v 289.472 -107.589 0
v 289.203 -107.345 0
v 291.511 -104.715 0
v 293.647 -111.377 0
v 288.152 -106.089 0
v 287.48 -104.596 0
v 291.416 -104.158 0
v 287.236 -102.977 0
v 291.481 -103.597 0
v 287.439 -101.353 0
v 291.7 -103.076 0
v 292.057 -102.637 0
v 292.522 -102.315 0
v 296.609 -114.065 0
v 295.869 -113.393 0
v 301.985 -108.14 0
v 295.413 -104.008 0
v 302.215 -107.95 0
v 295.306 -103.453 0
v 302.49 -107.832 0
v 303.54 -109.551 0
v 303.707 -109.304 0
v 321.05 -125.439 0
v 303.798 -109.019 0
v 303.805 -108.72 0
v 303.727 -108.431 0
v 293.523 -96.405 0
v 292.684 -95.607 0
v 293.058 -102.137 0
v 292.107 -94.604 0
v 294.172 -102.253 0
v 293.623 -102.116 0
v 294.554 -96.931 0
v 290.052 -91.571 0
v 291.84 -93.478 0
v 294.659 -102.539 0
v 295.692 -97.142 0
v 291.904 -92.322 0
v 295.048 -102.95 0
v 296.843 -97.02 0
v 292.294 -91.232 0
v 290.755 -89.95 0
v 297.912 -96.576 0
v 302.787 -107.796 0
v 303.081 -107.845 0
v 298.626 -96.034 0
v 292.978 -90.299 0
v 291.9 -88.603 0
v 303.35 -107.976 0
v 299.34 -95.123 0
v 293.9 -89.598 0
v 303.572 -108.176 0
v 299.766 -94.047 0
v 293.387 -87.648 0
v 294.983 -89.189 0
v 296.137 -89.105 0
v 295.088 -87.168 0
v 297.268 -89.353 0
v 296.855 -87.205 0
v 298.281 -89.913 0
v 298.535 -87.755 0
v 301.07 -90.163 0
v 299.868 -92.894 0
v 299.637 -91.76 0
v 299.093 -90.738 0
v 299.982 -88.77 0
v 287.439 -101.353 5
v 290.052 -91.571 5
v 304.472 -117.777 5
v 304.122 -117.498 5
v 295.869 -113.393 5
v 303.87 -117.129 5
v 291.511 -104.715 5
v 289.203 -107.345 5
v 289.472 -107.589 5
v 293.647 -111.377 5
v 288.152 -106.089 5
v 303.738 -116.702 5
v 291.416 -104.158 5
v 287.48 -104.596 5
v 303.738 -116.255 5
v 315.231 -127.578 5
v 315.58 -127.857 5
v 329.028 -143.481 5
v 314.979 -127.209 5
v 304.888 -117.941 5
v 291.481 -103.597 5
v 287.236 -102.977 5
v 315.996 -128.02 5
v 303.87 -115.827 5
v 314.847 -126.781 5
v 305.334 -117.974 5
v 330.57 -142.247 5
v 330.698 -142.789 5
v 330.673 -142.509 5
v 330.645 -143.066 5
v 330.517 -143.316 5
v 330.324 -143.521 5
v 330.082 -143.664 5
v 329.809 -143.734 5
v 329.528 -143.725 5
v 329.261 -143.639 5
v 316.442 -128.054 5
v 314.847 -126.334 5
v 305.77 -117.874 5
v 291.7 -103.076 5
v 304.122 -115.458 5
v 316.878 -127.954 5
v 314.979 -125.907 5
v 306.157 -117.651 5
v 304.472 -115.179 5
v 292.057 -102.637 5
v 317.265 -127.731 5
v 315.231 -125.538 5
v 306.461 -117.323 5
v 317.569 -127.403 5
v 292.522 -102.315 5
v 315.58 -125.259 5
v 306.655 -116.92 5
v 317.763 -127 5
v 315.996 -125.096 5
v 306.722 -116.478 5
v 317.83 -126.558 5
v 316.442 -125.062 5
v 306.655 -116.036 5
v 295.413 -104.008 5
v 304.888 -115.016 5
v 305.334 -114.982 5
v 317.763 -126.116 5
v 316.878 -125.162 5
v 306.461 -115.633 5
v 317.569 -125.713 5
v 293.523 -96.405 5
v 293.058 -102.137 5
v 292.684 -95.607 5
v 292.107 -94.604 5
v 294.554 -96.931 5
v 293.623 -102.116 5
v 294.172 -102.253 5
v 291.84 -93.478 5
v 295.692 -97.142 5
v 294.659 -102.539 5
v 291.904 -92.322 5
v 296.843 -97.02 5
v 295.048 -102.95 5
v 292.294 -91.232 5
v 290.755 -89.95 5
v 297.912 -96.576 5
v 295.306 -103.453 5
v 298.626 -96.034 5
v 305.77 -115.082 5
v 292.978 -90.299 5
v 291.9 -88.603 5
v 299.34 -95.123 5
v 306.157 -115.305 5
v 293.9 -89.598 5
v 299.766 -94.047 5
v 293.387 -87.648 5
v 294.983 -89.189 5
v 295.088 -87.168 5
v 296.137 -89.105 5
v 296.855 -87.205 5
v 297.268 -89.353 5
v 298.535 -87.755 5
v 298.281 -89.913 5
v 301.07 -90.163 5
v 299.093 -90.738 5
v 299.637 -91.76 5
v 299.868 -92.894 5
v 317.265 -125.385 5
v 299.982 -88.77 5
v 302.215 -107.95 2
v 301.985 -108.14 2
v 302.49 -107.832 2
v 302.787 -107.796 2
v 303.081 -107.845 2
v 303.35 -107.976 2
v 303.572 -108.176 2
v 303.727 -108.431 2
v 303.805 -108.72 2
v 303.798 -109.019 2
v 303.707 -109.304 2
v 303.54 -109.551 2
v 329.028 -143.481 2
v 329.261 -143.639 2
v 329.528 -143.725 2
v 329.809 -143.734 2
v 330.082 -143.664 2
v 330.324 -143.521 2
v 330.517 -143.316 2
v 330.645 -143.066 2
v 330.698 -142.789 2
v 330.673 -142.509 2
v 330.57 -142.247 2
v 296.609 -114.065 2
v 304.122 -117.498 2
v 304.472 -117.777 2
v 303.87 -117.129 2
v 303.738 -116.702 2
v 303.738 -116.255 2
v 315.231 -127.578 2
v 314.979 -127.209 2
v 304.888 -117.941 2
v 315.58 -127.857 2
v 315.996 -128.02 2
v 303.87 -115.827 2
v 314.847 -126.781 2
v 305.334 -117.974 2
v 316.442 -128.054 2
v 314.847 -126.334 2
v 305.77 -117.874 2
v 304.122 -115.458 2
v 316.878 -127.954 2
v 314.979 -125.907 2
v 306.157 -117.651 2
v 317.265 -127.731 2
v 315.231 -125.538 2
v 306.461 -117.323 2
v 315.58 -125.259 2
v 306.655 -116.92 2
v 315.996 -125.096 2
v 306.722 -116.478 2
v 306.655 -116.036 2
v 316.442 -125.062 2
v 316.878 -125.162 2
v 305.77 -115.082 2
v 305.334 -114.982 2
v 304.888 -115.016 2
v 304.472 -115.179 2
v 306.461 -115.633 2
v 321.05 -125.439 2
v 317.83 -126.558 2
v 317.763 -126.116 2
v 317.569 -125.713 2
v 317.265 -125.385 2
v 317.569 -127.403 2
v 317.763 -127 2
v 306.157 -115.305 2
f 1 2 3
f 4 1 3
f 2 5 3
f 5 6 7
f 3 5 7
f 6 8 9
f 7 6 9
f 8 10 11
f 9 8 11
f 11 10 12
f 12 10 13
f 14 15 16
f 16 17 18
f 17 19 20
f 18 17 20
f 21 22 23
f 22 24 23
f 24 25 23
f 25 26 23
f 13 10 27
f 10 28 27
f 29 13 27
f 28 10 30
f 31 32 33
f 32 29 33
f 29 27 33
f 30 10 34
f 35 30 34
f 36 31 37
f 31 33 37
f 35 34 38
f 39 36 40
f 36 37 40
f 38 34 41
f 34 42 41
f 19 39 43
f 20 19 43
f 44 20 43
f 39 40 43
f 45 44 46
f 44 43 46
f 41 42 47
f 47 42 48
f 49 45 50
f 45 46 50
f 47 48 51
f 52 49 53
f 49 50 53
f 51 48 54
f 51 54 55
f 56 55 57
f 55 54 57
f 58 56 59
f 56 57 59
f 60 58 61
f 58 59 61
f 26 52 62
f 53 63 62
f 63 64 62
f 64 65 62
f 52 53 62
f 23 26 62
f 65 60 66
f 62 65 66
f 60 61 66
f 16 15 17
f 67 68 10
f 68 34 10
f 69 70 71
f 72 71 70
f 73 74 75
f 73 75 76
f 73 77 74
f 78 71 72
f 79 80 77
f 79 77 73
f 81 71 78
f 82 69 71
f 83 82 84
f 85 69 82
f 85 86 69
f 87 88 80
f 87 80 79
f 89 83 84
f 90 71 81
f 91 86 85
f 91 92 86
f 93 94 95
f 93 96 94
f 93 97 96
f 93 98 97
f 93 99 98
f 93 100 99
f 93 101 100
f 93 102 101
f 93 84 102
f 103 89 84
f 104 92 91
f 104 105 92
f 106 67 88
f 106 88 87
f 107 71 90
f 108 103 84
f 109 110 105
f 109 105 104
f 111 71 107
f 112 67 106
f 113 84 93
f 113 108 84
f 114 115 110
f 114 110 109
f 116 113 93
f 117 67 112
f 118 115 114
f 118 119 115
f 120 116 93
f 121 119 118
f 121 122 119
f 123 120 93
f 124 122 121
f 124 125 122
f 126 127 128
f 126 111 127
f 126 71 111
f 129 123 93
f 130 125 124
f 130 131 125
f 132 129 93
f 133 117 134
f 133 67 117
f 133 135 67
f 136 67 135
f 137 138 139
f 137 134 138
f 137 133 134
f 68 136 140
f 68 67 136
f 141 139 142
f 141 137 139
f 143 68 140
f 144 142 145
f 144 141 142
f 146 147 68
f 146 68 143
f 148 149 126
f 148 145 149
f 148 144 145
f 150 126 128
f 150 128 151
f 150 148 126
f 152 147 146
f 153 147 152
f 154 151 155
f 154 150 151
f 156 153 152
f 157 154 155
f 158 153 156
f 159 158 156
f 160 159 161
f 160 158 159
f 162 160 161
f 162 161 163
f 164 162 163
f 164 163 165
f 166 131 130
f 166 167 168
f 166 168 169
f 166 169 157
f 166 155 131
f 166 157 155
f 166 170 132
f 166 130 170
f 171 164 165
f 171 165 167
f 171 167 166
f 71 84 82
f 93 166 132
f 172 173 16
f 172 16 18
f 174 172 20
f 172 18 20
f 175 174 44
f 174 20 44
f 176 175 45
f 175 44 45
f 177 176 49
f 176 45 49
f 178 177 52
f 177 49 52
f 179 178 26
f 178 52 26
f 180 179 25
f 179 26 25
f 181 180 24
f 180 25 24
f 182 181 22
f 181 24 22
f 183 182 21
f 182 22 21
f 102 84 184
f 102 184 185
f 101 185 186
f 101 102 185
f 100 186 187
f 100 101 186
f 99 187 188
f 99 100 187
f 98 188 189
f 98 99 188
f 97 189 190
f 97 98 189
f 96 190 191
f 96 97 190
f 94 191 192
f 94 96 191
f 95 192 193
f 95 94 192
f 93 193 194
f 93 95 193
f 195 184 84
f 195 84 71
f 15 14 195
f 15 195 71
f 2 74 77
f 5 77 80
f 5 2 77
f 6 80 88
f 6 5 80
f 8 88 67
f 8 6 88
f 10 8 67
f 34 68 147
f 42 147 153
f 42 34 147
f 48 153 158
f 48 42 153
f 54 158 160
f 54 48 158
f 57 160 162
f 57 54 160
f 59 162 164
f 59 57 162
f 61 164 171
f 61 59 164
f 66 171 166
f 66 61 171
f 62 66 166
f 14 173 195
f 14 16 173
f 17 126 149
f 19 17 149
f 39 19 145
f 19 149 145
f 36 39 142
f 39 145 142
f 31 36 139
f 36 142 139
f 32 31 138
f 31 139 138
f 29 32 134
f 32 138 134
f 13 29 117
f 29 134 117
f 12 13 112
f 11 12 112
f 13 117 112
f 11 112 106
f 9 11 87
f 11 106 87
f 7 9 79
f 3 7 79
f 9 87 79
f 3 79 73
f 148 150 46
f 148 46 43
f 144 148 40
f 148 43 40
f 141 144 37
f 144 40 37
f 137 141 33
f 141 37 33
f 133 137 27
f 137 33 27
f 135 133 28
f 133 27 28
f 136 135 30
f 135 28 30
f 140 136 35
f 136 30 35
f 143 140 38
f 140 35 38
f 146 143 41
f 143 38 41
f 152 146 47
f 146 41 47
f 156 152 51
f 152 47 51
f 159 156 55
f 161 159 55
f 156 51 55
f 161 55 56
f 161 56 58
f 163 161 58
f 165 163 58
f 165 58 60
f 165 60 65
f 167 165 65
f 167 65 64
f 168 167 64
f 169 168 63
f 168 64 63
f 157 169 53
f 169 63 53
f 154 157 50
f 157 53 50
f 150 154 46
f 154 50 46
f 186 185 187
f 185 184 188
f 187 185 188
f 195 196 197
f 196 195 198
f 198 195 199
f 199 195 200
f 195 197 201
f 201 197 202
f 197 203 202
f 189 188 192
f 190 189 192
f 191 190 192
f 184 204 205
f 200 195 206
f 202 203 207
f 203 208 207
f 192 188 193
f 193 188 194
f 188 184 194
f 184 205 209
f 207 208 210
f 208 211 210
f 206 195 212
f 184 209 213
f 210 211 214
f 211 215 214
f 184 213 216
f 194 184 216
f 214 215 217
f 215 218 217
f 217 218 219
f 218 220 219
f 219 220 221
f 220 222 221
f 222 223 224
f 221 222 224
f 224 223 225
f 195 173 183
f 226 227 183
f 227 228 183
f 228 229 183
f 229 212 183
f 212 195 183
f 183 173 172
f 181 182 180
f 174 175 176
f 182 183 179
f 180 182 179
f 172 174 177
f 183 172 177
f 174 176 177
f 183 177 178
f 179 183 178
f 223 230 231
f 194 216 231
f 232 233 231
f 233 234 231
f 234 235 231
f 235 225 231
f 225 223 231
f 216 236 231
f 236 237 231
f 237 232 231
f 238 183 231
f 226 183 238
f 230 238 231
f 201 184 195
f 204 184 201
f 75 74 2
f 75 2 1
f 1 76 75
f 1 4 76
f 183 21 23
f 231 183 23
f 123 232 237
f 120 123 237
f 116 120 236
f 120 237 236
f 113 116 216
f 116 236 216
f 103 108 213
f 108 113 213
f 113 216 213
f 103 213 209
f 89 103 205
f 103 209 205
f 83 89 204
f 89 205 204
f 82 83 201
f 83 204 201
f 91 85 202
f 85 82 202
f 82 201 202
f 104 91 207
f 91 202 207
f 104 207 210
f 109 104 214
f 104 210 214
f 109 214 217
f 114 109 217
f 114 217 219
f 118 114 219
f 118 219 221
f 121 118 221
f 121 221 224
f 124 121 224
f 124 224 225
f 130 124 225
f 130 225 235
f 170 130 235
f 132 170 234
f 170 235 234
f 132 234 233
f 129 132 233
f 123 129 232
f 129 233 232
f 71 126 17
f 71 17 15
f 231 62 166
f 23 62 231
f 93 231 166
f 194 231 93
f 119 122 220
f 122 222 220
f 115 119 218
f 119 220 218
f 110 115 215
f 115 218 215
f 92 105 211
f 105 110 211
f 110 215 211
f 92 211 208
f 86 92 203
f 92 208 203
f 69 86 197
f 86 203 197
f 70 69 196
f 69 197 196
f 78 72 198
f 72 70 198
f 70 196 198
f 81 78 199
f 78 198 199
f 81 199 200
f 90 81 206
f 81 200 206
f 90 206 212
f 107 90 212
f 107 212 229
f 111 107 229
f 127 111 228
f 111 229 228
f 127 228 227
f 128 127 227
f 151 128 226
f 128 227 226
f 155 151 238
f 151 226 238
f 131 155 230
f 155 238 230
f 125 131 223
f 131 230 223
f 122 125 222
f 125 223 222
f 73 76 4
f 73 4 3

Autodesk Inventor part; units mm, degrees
ref_plane "YZ Plane" through (0, 0, 0) normal (1, 0, 0) x (0, 1, 0)
ref_plane "XZ Plane" through (0, 0, 0) normal (0, 1, 0) x (-1, 0, 0)
ref_plane "XY Plane" through (0, 0, 0) normal (0, 0, 1) x (1, 0, 0)
sketch "スケッチ1" plane through (0, 0, 0) normal (0, 0, 1) x (1, 0, 0)
  circle A0 centre (295.848871, -93.120076) radius 1.5
  circle A1 centre (295.848871, -93.120076) radius 3.025
  line L0 (302.911618, -92.777137) -> (291.344796, -101.566309)
  arc A2 (282.40584, -101.176779) -> (291.344796, -101.566309) centre (287.109706, -95.992799) ccw
  arc A3 (299.078829, -95.689522) -> (299.346701, -89.542385) centre (296.658778, -92.504659) ccw
  line L1 (214.413679, -12.475426) -> (302.911618, -92.777137)
  line L2 (186.870748, -14.489658) -> (289.472001, -107.588508)
  line L3 (89.513673, -53) -> (377.048162, -53)
  circle A4 centre (295.848871, -93.120076) radius 4.025
  circle A5 centre (295.848871, -93.120076) radius 6
  line L4 (290.052231, -91.571215) -> (285.593636, -108.257588)
  circle A6 centre (285.42622, -97.165857) radius 3.025
  arc A7 (287.438666, -101.35253) -> (289.20342, -107.344802) centre (293.235305, -102.901391) ccw
  circle A8 centre (298.015884, -108.589531) radius 3
  circle A9 centre (298.015884, -108.589531) radius 1.5
  line L5 (185.106531, 0.614305) -> (481.333939, -268.178035)
  line L6 (295.848871, -93.120076) -> (289.20342, -100.443813) construction
  line L7 (301.069617, -90.163082) -> (333.637532, -147.663653)
  line L8 (333.637532, -147.663653) -> (289.20342, -107.344802)
  circle A10 centre (295.848871, -93.120076) radius 1.5
  circle A11 centre (295.848871, -93.120076) radius 3.025
  line L9 (302.911618, -92.777137) -> (291.344796, -101.566309)
  arc A12 (282.40584, -101.176779) -> (291.344796, -101.566309) centre (287.109706, -95.992799) ccw
  arc A13 (299.078829, -95.689522) -> (299.346701, -89.542385) centre (296.658778, -92.504659) ccw
  line L10 (214.413679, -12.475426) -> (302.911618, -92.777137)
  line L11 (186.870748, -14.489658) -> (289.472001, -107.588508)
  line L12 (89.513673, -53) -> (377.048162, -53)
  circle A14 centre (295.848871, -93.120076) radius 4.025
  circle A15 centre (295.848871, -93.120076) radius 6
  line L13 (290.052231, -91.571215) -> (285.593636, -108.257588)
  circle A16 centre (285.42622, -97.165857) radius 3.025
  arc A17 (287.438666, -101.35253) -> (289.20342, -107.344802) centre (293.235305, -102.901391) ccw
  circle A18 centre (298.015884, -108.589531) radius 3 construction
  circle A19 centre (298.015884, -108.589531) radius 1.5
  line L14 (185.106531, 0.614305) -> (481.333939, -268.178035)
  line L15 (295.848871, -93.120076) -> (289.20342, -100.443813) construction
  line L16 (301.069617, -90.163082) -> (333.637532, -147.663653)
  line L17 (333.637532, -147.663653) -> (289.20342, -107.344802)
  line L18 (301.984952, -108.140062) -> (343.184474, -145.523895)
  circle A20 centre (305.221577, -116.478183) radius 1.5
  circle A21 centre (316.330105, -126.557896) radius 1.5
  line L19 (301.984952, -108.140062) -> (293.498432, -117.492783)
  arc A22 (303.540146, -109.551222) -> (301.984952, -108.140062) centre (302.762549, -108.845642) ccw
  line L20 (301.984952, -108.140062) -> (302.762549, -108.845642) construction
  line L21 (303.540146, -109.551222) -> (302.762549, -108.845642) construction
  point P0 (0, 0)
  point P1 (0, 0)
  point P2 (297.912288, -96.575931)
  point P3 (298.625557, -96.033946)
  point P4 (0, 0)
  point P5 (296.609105, -114.064611)
  point P6 (321.049741, -125.439168)
  dimension "d0" = 8.05
  dimension "d1" = 12
  dimension "d2" = 6
  dimension "d3" = 6
  dimension "d4" = 3
  dimension "d5" = 5
  dimension "d6" = 12
  dimension "d7" = 60
  dimension "d11" = 8.05
  dimension "d12" = 12
  dimension "d13" = 6
  dimension "d14" = 6
  dimension "d15" = 3
  dimension "d16" = 5
  dimension "d17" = 12
  dimension "d18" = 60
  dimension "d19" = 8
  dimension "d20" = 4
  dimension "d21" = 4
  dimension "d22" = 3
  dimension "d23" = 50
  dimension "d24" = 8
  dimension "d25" = 15
  dimension "d28" = 1.05
  dimension "d29" = 180
extrude "押し出し1" add sketch "スケッチ1" along normal blind 5 contours L7 L5 A5 L0 | L0 A5 L1 L7 | L1 A5 L7 | A5 L5 L0 A4 | L0 A3 L1 A5 | L7 L18 A22 L19 A8 L8 L2 A7 A2 L0 A5 L5 | L1 A5 | L0 A4 L5 A5 L1 A3 | A5 L0 L5 | L7 L8 L19 A8 L18 | A4 L0 | A5 L5 L0 | L0 A2 A7 L4 L5 A5 | L18 A22 | A5 L5 L4 | L19 A8 | A8 L19 | A9 picked at (298.233704, -96.341002)
fillet "フィレット1" radius 1 1 edges at (333.6375, -147.6637, 2.5)
extrude "押し出し2" cut sketch "スケッチ1" along normal blind 2 contours L7 L8 L19 A8 L18 | L18 A22 | L19 A8 picked at (299.870596, -110.60445)
sketch "スケッチ2" plane through (0, 0, 5) normal (0, 0, 1) x (1, 0, 0)
  arc A0 (329.027651, -143.480716) -> (330.569756, -142.247316) centre (329.699632, -142.740148) ccw
  line L0 (330.569756, -142.247316) -> (301.069617, -90.163082)
  arc A1 (301.069617, -90.163082) -> (290.052231, -91.571215) centre (295.848871, -93.120076) ccw
  line L1 (290.052231, -91.571215) -> (287.438666, -101.35253)
  arc A2 (287.438666, -101.35253) -> (289.20342, -107.344802) centre (293.235305, -102.901391) ccw
  line L2 (289.20342, -107.344802) -> (329.027651, -143.480716)
  arc A3 (298.625557, -96.033946) -> (297.912288, -96.575931) centre (295.848871, -93.120076) ccw
  line L3 (298.625557, -96.033946) -> (297.912288, -96.575931)
  circle A4 centre (316.330105, -126.557896) radius 1.5
  circle A5 centre (305.221577, -116.478183) radius 1.5
  line L4 (301.984952, -108.140062) -> (296.609105, -114.064611)
  line L5 (289.20342, -107.344802) -> (296.609105, -114.064611)
  line L6 (293.646831, -111.376687) -> (291.510724, -104.715452)
  line L7 (295.412844, -104.007733) -> (295.868537, -113.39263)
  arc A6 (295.412844, -104.007733) -> (291.510724, -104.715452) centre (293.415198, -104.104731) ccw
  point P0 (0, 0)
  point P1 (293.646831, -111.376687)
  dimension "d31" = 30
  dimension "d32" = 45
  dimension "d33" = 3
  dimension "d34" = 2
  dimension "d37" = 1
extrude "押し出し3" cut sketch "スケッチ2" against normal blind 10 contours L2 L6 A6 L7
equation "\"d20\" = 0.5 * d19"
equation "\"d21\" = d20"
properties part number "アーム先端" material "ポリカーボネート、スモーク"
